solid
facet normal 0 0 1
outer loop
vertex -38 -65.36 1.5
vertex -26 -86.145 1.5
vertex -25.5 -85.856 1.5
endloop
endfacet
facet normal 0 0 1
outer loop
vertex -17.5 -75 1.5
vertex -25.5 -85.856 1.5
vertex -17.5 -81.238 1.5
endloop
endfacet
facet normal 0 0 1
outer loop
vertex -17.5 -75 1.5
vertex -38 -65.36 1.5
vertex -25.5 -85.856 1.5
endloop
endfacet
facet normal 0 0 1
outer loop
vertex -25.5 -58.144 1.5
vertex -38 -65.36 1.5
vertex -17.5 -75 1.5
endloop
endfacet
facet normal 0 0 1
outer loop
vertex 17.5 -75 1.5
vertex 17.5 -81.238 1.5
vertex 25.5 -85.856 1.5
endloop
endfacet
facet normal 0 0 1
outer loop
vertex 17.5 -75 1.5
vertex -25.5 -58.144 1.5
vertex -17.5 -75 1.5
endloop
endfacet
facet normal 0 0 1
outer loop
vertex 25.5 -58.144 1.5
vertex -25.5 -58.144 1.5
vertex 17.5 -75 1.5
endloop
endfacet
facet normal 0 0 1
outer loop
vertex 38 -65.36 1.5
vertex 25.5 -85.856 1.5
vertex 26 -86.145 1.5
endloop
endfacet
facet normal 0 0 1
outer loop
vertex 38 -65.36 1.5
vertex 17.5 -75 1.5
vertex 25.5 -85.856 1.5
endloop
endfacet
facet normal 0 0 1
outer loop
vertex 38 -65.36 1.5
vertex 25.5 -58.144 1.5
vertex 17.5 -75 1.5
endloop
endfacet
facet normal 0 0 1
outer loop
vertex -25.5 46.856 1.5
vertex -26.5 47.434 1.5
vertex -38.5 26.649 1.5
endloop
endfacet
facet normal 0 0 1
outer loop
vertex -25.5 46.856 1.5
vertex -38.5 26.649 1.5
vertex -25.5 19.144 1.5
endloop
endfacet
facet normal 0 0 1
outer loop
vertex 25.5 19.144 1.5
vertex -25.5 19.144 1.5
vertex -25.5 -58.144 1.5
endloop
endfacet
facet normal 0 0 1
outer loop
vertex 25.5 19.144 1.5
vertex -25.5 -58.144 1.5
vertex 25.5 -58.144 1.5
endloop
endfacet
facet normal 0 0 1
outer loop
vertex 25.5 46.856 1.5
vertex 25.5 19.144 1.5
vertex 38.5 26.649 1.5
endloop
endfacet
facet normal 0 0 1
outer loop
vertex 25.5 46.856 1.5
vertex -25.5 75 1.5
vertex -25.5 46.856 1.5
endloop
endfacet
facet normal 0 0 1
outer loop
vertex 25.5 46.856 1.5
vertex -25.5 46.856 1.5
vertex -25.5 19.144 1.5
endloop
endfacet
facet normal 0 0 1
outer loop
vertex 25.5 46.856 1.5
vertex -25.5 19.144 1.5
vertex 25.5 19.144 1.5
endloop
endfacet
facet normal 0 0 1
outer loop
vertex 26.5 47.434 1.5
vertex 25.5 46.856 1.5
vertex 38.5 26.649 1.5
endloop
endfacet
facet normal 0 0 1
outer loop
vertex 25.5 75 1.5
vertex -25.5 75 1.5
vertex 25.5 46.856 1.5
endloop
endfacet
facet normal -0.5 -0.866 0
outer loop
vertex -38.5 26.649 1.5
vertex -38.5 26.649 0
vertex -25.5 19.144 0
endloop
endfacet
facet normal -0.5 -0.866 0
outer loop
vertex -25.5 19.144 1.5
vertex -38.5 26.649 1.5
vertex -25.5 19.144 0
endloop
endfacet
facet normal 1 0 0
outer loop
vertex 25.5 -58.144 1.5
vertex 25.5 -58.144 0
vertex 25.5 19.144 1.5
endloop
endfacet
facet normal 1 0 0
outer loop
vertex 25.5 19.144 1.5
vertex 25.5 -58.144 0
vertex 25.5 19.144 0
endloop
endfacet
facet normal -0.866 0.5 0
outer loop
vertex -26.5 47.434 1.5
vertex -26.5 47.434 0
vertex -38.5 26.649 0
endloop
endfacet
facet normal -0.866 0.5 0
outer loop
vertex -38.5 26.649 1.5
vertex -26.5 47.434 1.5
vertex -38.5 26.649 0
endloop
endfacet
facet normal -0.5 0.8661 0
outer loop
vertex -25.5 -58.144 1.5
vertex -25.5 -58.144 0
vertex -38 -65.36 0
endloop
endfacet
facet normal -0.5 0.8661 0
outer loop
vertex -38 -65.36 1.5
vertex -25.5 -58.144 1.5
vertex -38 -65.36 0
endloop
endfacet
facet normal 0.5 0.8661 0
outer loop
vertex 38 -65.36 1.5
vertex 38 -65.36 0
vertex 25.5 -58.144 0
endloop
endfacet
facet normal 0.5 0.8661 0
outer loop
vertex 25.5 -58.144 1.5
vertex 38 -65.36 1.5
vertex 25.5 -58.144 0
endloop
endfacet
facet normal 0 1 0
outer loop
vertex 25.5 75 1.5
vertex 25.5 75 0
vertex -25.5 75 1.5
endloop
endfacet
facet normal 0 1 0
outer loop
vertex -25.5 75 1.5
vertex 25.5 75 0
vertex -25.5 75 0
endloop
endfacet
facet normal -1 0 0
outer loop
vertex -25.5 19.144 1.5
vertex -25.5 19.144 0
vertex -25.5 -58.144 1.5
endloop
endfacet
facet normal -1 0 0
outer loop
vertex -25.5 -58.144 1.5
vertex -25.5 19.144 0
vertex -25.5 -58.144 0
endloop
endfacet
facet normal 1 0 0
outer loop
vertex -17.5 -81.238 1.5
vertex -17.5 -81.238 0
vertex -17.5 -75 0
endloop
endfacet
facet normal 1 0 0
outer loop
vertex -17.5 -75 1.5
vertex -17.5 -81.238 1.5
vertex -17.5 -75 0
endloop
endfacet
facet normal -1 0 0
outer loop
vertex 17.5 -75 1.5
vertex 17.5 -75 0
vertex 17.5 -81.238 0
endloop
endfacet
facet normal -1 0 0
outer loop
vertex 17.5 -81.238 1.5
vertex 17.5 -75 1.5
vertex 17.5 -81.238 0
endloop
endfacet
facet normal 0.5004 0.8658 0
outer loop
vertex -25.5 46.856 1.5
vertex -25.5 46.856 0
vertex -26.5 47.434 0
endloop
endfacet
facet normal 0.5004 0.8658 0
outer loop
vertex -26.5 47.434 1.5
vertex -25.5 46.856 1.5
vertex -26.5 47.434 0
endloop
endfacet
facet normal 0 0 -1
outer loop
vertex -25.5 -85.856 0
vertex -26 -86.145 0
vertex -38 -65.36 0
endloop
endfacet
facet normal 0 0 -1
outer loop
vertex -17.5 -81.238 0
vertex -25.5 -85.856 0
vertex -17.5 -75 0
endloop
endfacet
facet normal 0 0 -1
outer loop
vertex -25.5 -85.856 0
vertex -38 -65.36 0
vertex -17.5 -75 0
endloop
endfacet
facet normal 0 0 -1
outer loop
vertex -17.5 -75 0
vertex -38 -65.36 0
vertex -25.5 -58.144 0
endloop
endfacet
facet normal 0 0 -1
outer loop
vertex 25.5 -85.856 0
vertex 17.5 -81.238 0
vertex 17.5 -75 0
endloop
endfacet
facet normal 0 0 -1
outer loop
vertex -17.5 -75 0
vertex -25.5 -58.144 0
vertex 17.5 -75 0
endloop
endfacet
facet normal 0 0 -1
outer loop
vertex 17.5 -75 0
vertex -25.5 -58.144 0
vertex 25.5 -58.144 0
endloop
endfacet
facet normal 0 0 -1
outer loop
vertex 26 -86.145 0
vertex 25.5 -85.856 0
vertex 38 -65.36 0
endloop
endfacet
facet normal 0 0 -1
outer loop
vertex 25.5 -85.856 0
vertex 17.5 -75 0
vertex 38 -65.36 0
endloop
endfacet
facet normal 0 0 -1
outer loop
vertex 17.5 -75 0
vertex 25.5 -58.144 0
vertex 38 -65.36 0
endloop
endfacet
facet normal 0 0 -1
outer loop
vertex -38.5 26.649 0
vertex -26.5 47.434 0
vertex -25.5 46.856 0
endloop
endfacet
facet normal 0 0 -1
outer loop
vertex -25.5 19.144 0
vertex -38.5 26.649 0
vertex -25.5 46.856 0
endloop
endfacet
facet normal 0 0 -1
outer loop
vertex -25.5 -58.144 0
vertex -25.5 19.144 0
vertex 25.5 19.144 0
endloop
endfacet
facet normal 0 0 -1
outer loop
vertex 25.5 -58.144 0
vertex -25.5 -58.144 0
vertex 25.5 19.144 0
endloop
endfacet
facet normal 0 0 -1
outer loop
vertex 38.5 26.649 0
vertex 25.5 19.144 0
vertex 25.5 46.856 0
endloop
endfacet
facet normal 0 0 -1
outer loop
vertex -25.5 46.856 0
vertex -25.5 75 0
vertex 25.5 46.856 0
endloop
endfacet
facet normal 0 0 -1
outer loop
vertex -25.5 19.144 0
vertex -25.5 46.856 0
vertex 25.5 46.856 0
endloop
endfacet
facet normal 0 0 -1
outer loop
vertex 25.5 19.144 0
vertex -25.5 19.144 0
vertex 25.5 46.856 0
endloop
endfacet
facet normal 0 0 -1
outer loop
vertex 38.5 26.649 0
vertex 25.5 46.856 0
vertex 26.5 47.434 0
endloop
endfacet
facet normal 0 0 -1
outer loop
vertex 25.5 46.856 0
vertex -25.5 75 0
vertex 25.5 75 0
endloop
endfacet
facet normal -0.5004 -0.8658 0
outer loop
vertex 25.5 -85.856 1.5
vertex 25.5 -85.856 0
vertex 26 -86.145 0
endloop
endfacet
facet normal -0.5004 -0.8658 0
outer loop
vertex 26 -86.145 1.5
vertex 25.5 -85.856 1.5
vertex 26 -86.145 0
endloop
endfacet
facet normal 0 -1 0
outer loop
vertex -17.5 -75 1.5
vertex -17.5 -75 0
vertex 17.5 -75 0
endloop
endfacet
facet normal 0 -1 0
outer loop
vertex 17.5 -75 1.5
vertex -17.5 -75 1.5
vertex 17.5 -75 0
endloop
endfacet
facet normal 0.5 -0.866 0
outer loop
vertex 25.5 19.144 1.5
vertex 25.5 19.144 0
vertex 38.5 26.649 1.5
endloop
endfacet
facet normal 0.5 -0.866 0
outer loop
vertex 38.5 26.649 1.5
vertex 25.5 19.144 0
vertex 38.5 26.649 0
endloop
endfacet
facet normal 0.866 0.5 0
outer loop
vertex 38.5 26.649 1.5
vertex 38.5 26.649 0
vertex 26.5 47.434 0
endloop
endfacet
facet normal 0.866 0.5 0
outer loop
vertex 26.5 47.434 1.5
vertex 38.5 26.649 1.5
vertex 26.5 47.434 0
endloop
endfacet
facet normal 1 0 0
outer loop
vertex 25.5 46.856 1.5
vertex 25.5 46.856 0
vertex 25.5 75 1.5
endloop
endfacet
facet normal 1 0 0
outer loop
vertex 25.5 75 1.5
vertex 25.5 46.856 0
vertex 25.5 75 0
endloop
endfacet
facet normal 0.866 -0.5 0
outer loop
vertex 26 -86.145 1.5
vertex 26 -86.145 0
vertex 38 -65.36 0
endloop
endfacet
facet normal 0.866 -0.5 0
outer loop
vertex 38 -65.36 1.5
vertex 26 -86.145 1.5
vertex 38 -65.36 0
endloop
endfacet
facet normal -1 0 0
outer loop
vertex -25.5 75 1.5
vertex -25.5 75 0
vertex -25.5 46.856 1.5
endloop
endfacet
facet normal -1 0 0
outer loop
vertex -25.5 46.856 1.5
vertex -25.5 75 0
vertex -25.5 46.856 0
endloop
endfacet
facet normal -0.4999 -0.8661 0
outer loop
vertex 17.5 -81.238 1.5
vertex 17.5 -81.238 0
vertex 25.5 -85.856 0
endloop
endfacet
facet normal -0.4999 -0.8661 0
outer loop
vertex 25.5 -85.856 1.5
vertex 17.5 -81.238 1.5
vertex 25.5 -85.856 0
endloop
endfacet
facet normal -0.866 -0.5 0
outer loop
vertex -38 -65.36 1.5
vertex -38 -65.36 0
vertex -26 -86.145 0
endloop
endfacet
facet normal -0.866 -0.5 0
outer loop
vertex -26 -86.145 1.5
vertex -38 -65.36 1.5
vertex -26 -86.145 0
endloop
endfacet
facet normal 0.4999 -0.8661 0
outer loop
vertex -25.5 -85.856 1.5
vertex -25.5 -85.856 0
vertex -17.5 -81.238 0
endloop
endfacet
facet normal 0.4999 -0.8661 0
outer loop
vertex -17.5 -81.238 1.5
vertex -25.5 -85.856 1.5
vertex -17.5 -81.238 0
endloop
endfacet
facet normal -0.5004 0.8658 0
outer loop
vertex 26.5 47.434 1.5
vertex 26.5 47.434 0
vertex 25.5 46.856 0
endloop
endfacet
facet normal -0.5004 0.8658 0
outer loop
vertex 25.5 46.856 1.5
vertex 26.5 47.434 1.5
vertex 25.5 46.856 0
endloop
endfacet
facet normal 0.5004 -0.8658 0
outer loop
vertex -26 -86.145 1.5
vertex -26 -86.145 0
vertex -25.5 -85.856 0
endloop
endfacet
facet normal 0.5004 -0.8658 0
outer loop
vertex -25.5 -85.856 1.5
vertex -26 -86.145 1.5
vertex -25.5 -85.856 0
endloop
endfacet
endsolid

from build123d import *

# Parameters (mm, degrees)
F2_DEPTH = 1.5


with BuildPart() as f2:
    # F1 (on Top) → F2 (new body)
    with BuildSketch(Plane.XY):
        Polygon((17.5, -75), (25.5, -75), (25.5, -58.143594), (25.5, 19.143594), (25.5, 46.856406), (25.5, 75), (-25.5, 75), (-25.5, 46.856406), (-25.5, 19.143594), (-25.5, -58.143594), (-25.5, -75), (-17.5, -75), align=None)
        Polygon((-38.5, 26.649147), (-25.5, 19.143594), (-25.5, 46.856406), (-26.5, 47.433757), align=None)
        Polygon((25.5, 46.856406), (25.5, 19.143594), (38.5, 26.649147), (26.5, 47.433757), align=None)
        Polygon((25.5, -58.143594), (25.5, -75), (17.5, -75), (17.5, -81.237604), (25.5, -85.856406), (26, -86.145082), (38, -65.360472), align=None)
        Polygon((-17.5, -81.237604), (-17.5, -75), (-25.5, -75), (-25.5, -58.143594), (-38, -65.360472), (-26, -86.145082), (-25.5, -85.856406), align=None)
    extrude(amount=F2_DEPTH)


solid = f2.part
